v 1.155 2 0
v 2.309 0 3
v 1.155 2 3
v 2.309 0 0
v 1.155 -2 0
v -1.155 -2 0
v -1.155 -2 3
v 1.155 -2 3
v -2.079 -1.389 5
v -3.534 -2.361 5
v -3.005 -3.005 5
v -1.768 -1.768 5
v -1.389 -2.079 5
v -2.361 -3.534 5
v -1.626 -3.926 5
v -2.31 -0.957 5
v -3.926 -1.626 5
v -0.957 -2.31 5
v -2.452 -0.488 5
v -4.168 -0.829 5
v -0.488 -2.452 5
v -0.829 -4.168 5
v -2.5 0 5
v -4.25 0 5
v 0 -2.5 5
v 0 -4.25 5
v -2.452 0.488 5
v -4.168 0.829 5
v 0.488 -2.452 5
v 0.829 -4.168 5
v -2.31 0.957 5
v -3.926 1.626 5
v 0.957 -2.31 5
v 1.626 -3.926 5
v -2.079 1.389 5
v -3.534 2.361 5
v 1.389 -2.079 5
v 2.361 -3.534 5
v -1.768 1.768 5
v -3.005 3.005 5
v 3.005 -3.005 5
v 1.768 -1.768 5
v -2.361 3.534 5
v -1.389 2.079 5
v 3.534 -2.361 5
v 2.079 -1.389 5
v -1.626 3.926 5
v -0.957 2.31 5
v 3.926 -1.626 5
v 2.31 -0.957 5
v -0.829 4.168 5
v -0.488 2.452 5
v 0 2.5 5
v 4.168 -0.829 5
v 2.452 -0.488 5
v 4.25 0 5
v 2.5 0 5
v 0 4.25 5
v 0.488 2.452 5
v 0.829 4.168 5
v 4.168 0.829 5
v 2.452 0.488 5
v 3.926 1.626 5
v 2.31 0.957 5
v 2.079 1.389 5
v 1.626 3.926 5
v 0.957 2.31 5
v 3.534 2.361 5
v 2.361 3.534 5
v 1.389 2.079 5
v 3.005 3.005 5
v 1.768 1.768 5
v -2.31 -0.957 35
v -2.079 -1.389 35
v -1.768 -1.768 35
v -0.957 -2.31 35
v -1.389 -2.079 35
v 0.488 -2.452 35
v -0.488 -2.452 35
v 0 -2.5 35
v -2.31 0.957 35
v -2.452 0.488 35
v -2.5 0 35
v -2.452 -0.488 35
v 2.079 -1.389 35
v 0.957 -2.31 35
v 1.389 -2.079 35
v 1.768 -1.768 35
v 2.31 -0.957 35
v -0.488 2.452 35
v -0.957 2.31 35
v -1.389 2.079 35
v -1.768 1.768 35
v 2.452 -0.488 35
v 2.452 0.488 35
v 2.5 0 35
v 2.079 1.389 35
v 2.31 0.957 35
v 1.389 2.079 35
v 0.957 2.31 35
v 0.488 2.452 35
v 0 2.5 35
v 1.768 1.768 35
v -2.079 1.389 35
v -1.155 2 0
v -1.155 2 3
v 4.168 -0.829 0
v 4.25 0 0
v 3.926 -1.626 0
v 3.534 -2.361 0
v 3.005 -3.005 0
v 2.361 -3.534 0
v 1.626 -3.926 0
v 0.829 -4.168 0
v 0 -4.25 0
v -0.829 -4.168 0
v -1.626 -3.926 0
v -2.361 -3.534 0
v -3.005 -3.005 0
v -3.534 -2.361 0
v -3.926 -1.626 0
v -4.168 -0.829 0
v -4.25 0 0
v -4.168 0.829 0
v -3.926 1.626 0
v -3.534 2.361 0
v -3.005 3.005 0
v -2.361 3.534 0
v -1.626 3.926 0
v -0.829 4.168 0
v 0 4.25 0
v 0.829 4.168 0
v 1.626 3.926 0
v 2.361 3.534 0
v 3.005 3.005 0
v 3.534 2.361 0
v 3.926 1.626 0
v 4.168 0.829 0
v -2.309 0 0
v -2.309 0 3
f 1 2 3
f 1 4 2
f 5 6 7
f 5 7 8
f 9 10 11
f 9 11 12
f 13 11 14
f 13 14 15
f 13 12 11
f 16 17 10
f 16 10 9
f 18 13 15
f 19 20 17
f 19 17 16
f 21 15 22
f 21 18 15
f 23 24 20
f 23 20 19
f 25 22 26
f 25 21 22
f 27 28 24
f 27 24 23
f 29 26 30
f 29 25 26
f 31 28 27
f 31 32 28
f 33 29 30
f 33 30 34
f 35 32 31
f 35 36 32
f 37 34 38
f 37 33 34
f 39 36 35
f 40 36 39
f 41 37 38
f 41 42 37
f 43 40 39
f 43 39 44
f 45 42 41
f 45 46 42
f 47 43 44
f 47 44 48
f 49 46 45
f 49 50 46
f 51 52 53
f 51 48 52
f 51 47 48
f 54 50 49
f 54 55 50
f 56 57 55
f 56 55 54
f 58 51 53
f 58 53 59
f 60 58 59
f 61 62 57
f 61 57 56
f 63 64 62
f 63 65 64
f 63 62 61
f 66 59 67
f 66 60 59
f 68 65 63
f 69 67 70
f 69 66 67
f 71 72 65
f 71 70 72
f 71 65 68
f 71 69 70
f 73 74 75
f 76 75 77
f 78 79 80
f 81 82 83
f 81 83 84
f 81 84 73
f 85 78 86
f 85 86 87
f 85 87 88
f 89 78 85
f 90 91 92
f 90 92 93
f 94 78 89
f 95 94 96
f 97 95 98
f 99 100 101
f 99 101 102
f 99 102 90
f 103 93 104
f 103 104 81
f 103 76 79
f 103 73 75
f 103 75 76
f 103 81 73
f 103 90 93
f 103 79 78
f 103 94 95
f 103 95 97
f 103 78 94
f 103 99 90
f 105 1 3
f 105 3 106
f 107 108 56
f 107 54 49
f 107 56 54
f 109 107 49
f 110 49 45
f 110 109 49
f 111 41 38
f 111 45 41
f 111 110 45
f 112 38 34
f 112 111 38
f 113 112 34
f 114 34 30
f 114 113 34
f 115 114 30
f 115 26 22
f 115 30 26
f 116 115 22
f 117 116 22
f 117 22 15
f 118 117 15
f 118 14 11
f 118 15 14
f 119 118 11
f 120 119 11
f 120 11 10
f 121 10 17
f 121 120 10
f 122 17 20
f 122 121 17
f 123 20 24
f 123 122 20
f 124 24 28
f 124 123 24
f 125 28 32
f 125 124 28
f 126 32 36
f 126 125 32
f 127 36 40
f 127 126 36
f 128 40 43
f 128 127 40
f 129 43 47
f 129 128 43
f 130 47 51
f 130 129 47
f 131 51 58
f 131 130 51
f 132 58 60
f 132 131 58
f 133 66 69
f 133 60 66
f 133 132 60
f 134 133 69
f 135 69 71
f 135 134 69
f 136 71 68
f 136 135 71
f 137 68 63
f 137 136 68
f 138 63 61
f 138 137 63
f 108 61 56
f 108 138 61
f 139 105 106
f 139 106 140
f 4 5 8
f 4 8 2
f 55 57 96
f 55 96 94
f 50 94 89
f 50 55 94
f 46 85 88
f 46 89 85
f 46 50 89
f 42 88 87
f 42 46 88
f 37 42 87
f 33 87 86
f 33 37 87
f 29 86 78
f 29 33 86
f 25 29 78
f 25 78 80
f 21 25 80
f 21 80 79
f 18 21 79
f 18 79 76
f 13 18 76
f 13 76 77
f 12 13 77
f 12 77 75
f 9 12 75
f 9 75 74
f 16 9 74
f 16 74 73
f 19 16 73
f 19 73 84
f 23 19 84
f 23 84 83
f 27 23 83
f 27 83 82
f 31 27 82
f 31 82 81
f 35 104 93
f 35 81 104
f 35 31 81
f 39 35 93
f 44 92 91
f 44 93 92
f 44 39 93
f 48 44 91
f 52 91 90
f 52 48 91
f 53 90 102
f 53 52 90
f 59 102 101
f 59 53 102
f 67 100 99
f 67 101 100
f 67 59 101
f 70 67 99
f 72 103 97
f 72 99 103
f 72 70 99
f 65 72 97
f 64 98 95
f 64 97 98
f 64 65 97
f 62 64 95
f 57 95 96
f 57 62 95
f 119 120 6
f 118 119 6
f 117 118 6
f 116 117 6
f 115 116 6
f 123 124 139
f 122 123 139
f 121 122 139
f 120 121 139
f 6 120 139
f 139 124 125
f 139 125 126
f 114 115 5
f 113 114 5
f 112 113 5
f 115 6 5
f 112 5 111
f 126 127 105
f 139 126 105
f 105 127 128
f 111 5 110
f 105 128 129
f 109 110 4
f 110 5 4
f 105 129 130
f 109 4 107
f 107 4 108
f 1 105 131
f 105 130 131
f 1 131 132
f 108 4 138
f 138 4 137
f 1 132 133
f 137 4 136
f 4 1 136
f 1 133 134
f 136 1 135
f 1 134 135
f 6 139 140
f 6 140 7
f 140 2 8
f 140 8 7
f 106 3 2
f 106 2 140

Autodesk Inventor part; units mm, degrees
ref_plane "YZ Plane" through (0, 0, 0) normal (1, 0, 0) x (0, 1, 0)
ref_plane "XZ Plane" through (0, 0, 0) normal (0, 1, 0) x (-1, 0, 0)
ref_plane "XY Plane" through (0, 0, 0) normal (0, 0, 1) x (1, 0, 0)
sketch "Sketch1" plane through (0, 0, 0) normal (0, 0, 1) x (1, 0, 0)
  circle A0 centre (0, 0) radius 4.25
  dimension "d0" = 8.5
extrude "Extrusion1" add sketch "Sketch1" along normal blind 5
sketch "Sketch2" plane through (0, 0, 5) normal (0, 0, 1) x (1, 0, 0)
  circle A0 centre (0, 0) radius 4.25 projected
  circle A1 centre (0, 0) radius 2.5
  dimension "d3" = 5
extrude "Extrusion2" add sketch "Sketch2" along normal blind 30 contours A1
sketch "Sketch3" plane through (0, 0, 0) normal (0, 0, -1) x (-1, 0, 0)
  circle A0 centre (0, 0) radius 4.25 projected
  line L0 (2.3094, 0) -> (1.1547, -2)
  line L1 (1.1547, -2) -> (-1.1547, -2)
  line L2 (-1.1547, -2) -> (-2.3094, 0)
  line L3 (-2.3094, 0) -> (-1.1547, 2)
  line L4 (-1.1547, 2) -> (1.1547, 2)
  line L5 (1.1547, 2) -> (2.3094, 0)
  dimension "d6" = 4
extrude "Extrusion3" cut sketch "Sketch3" against normal blind 3 contours L0 L1 L2 L3 L4 L5
thread "Thread1" size "M5x0.8" class "6g" standard "ANSI Metric M Profile" full length
properties part number "m5x0.8"
